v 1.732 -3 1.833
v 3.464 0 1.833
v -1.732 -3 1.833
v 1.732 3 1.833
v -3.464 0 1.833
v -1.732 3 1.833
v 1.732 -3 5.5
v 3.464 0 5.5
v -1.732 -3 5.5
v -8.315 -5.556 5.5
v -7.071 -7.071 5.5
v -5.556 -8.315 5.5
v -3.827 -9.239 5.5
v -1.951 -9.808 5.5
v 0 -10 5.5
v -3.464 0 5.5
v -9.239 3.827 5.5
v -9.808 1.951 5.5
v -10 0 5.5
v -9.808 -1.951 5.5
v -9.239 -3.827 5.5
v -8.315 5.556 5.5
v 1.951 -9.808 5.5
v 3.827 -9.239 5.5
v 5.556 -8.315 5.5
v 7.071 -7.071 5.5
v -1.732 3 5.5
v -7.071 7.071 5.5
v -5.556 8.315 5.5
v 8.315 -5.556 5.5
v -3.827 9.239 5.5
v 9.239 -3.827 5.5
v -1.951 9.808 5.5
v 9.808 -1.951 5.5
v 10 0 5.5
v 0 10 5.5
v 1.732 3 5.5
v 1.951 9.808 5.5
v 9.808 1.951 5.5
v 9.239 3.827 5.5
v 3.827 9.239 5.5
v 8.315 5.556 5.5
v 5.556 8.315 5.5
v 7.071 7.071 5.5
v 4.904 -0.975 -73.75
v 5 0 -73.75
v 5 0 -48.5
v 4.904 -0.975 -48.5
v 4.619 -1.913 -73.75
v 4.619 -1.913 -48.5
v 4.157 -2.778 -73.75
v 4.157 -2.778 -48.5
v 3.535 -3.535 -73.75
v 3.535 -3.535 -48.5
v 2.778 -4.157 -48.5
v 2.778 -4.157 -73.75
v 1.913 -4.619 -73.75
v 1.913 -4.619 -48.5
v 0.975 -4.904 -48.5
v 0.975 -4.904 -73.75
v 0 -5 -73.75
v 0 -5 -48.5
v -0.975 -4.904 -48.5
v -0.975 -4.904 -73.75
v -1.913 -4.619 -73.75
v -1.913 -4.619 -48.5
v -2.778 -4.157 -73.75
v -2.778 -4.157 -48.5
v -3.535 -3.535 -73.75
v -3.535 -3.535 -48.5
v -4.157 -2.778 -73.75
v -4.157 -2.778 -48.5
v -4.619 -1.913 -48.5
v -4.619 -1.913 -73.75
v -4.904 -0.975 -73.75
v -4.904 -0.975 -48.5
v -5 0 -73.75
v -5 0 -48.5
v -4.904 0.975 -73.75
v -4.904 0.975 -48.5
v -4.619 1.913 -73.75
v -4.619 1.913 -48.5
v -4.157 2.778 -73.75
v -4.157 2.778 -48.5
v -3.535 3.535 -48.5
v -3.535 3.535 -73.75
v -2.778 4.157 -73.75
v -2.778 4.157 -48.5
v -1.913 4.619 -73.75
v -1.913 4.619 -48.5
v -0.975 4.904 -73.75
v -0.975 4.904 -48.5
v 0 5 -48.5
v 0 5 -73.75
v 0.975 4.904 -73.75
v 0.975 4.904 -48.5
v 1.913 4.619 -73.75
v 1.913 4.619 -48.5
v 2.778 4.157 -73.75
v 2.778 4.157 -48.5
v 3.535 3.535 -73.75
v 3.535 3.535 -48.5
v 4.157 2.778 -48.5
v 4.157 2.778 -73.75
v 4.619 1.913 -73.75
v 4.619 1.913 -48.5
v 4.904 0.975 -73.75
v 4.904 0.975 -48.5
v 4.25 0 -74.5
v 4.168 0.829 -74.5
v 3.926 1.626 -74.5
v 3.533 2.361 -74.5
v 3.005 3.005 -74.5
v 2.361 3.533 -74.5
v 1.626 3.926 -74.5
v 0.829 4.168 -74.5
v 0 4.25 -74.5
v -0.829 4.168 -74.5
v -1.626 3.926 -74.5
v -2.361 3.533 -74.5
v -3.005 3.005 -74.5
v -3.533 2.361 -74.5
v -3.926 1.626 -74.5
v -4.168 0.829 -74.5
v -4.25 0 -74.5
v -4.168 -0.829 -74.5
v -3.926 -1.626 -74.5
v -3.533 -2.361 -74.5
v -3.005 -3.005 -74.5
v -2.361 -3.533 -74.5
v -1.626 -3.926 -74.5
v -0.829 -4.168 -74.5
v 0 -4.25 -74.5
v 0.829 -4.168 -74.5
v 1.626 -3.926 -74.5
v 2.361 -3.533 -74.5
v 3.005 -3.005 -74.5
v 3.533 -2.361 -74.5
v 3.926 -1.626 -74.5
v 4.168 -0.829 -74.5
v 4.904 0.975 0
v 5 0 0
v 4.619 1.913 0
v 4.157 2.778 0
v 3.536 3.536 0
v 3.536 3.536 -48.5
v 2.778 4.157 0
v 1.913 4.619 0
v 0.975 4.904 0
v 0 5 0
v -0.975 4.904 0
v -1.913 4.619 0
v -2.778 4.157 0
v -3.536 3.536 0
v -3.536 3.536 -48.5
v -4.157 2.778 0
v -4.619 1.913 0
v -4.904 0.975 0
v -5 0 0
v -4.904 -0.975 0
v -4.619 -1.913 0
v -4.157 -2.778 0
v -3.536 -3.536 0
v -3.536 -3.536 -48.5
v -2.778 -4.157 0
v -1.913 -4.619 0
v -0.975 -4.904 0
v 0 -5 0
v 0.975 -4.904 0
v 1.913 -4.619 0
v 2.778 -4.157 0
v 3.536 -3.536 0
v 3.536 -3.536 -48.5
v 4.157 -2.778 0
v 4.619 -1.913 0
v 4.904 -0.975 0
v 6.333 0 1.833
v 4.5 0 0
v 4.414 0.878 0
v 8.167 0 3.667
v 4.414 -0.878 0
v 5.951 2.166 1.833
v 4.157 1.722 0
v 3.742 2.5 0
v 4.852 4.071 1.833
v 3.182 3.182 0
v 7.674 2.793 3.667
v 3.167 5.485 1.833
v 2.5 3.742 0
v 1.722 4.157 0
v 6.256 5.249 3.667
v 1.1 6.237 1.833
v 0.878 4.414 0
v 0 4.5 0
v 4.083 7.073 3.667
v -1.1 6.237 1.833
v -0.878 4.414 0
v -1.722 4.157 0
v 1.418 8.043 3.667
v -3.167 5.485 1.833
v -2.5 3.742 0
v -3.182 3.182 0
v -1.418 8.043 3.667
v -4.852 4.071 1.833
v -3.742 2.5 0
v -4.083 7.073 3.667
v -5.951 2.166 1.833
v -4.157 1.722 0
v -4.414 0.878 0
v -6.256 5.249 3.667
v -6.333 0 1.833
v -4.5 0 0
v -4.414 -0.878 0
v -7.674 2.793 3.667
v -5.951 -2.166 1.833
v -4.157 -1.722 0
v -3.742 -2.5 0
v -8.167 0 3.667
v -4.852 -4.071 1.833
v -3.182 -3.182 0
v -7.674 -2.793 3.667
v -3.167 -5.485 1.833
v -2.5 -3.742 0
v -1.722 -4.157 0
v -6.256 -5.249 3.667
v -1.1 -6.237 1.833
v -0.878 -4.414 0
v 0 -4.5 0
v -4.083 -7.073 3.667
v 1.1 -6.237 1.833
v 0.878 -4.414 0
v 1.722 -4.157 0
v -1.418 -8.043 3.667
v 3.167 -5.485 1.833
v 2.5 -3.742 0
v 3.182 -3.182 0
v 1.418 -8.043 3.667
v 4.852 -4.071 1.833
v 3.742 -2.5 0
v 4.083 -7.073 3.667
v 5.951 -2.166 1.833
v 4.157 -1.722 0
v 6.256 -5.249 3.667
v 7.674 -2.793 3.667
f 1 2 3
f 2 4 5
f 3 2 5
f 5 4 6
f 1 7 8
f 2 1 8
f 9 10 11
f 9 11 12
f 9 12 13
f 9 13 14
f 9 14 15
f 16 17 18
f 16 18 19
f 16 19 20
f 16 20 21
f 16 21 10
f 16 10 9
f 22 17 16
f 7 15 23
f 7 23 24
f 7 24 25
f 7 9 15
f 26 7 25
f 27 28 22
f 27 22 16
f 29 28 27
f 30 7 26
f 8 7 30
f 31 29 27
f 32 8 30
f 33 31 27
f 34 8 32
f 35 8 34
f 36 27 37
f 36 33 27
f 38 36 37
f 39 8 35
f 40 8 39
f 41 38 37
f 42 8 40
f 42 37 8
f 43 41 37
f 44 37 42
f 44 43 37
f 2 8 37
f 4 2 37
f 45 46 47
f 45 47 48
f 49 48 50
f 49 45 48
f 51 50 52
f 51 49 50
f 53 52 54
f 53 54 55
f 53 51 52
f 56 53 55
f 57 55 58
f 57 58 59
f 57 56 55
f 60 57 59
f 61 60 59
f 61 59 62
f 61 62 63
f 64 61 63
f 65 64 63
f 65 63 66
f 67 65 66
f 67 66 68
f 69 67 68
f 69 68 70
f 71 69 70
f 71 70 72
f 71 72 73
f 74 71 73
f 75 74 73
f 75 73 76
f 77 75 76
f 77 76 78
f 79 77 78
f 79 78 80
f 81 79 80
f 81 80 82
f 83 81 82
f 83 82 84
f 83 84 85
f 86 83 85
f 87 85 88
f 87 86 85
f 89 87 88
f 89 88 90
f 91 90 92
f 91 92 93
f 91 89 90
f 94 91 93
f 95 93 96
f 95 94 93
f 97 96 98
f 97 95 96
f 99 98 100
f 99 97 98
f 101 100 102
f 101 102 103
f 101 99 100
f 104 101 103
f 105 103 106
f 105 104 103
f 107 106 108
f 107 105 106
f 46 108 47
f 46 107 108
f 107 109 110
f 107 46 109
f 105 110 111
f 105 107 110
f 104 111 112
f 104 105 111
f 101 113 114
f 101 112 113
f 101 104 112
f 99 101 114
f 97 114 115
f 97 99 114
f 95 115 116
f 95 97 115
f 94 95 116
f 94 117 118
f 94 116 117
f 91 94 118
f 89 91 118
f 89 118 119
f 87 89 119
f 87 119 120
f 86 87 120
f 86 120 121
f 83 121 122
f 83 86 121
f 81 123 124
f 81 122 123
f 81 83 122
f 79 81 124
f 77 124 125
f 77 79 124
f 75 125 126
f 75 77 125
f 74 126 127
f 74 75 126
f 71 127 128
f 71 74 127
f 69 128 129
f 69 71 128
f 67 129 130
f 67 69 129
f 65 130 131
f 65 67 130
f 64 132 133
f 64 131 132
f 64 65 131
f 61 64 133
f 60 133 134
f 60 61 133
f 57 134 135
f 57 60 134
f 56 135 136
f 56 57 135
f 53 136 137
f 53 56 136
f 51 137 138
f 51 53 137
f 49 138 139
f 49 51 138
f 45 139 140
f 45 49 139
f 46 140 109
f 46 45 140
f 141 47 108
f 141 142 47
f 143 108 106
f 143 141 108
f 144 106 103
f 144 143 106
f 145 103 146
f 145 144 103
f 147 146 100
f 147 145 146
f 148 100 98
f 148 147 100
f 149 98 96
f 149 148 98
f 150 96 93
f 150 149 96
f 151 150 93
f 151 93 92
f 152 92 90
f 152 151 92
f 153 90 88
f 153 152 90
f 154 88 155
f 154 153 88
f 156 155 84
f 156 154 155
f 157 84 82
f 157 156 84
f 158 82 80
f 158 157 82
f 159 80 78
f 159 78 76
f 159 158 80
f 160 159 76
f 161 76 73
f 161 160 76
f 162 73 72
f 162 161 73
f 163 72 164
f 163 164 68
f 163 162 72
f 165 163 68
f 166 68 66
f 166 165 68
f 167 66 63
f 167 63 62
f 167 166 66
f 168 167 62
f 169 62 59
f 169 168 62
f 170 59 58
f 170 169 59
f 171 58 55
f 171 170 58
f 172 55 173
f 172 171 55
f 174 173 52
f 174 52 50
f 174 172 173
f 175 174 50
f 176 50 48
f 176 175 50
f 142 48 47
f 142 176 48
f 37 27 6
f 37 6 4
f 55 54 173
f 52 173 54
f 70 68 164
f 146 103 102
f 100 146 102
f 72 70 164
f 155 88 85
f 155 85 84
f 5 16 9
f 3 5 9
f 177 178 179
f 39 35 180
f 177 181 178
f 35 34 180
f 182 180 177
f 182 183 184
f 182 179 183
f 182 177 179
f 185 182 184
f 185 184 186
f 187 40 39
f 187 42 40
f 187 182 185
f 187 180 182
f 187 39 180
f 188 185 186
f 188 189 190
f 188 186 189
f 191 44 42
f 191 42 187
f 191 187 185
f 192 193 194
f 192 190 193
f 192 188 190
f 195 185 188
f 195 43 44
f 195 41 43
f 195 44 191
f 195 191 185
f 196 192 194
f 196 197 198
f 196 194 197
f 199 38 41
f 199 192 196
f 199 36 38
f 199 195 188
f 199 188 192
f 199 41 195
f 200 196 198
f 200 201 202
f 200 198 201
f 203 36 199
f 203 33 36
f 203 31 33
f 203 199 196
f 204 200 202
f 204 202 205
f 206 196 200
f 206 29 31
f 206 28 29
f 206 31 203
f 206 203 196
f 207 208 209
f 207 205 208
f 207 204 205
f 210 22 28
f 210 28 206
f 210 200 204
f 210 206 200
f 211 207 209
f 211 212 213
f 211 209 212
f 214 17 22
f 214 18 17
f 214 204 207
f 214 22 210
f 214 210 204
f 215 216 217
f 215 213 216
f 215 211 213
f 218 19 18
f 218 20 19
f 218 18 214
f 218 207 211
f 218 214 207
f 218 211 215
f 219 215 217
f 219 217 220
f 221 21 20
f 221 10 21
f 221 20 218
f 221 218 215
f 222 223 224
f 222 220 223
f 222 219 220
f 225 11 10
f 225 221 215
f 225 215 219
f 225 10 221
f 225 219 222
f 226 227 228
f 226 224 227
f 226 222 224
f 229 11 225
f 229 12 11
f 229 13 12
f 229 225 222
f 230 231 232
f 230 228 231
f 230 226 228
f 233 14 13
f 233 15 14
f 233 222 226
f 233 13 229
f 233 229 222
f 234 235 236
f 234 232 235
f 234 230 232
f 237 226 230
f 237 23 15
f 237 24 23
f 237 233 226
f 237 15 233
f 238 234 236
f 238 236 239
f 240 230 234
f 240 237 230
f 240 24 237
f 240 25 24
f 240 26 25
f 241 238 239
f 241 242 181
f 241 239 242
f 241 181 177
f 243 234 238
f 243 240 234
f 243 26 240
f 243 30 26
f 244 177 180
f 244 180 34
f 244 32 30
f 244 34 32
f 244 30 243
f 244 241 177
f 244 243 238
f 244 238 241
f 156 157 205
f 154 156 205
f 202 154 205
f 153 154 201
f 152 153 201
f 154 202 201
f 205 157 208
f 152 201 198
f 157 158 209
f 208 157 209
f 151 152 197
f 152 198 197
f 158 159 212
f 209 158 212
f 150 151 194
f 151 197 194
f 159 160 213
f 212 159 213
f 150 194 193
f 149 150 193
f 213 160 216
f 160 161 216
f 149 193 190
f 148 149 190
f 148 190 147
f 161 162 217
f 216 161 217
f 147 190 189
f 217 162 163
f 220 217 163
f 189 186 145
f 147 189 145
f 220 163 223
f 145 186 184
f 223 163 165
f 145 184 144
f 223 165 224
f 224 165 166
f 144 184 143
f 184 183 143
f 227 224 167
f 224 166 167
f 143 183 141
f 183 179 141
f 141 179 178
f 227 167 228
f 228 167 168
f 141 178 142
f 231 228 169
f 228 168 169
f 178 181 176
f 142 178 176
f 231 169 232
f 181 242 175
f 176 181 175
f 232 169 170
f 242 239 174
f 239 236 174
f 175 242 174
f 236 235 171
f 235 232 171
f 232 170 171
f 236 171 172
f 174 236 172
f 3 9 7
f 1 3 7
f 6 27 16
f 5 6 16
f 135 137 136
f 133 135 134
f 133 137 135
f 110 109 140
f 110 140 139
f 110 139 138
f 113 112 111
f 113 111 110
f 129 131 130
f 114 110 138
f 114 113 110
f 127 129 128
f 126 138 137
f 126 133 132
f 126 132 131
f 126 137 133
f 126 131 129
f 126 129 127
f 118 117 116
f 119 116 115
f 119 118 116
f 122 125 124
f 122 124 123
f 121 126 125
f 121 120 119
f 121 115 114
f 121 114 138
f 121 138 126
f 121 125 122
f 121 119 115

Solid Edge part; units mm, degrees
sketch "Sketch1" plane through (0, 0, 0) normal (0, 0, 1) x (1, 0, 0)
  circle A0 centre (0, 0) radius 10
  dimension "D1" = 20
extrude "Protrusion1" add sketch "Sketch1" along normal blind 5.5
sketch "Sketch2" plane through (0, 0, 0) normal (0, 0, -1) x (1, 0, 0)
  circle A0 centre (0, 0) radius 5
extrude "Protrusion2" add sketch "Sketch2" along normal blind 74.5
sketch "Sketch3" plane through (0, 0, -74.5) normal (0, 0, -1) x (1, 0, 0)
  circle A0 centre (0, 0) radius 4.9997
extrude "Cutout1" cut sketch "Sketch3" against normal blind 26 flip side to cut
chamfer "Chamfer_1" distance 0.75 angle 45 1 edges at (-4.9997, 0, -74.5)
sketch "Sketch4" plane through (0, 0, 5.5) normal (0, 0, 1) x (1, 0, 0)
  line L0 (-1.7321, 3) -> (1.7321, 3)
  line L1 (3.4641, 0) -> (1.7321, 3)
  line L2 (1.7321, -3) -> (3.4641, 0)
  line L3 (-1.7321, -3) -> (1.7321, -3)
  line L4 (-3.4641, 0) -> (-1.7321, -3)
  line L5 (-1.7321, 3) -> (-3.4641, 0)
  dimension "D1" = 6
extrude "Cutout2" cut sketch "Sketch4" against normal blind 3.6667
sketch "Sketch5" plane through (0, 0, 0) normal (0, -1, 0) x (1, 0, 0)
  line L0 (10, 5.5) -> (4.5, 0)
  line L1 (4.5, 0) -> (10, 0)
  line L2 (10, 0) -> (10, 5.5)
revolve "RevolvedCutout1" cut sketch "Sketch5" angle 360 about axis through (0, 0, 14.0017) along (0, 0, -1)
properties part number "300546"
